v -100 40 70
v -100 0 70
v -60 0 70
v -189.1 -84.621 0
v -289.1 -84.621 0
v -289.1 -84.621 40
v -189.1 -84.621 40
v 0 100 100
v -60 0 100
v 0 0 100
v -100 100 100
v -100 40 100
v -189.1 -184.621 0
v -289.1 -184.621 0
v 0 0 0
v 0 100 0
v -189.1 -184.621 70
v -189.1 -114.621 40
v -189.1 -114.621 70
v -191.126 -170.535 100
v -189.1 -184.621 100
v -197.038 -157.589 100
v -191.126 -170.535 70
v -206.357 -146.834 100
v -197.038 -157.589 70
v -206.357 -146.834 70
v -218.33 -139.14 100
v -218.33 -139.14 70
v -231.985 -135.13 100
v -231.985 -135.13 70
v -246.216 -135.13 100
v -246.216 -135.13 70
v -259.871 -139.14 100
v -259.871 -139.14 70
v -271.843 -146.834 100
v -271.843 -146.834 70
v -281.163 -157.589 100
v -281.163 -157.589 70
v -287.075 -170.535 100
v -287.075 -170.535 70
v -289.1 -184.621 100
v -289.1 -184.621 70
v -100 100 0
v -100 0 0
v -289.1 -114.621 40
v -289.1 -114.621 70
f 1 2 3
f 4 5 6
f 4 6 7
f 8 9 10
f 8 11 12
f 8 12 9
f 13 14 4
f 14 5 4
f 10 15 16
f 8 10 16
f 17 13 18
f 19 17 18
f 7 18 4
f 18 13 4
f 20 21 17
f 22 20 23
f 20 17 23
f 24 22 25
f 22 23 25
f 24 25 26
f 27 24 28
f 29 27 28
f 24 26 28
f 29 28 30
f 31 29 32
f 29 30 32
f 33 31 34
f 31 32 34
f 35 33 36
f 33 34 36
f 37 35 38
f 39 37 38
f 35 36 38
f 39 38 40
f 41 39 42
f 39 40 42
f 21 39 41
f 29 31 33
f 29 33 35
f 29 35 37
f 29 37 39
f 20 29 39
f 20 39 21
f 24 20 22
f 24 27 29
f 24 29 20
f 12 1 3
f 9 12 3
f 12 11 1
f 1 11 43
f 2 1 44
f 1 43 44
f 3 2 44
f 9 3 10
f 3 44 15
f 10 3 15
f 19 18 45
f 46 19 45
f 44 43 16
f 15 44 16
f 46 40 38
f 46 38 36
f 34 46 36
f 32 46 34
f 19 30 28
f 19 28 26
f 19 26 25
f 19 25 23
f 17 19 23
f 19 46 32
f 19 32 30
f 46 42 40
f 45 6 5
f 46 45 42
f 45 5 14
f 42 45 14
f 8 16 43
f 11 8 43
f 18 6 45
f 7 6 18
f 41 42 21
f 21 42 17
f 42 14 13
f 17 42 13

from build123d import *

# Parameters (mm, degrees)
F1_DEPTH = 100
F2_DEPTH = 70
F3_W     = 100
F3_H     = 30
F4_DEPTH = 40
F5_DEPTH = 70
F6_DEPTH = 100


with BuildPart() as f1:
    # F0 (on Top) → F1 (new body)
    with BuildSketch(Plane.XY):
        Polygon((-60, 0), (0, 0), (0, 100), (-100, 100), (-100, 40), align=None)
    extrude(amount=F1_DEPTH)

    # F0 (on Top) → F2 (join)
    with BuildSketch(Plane.XY):
        Polygon((-100, 0), (-60, 0), (-100, 40), align=None)
        Polygon((-60, 0), (0, 0), (0, 100), (-100, 100), (-100, 40), align=None)
    extrude(amount=F2_DEPTH)


with BuildPart() as f4:
    # F3 (on Top) → F4 (new body)
    with BuildSketch(Plane.XY):
        with Locations((-239.100334983, -99.6214152873)):
            Rectangle(F3_W, F3_H)
    extrude(amount=F4_DEPTH)

    # F3 (on Top) → F5 (join)
    with BuildSketch(Plane.XY):
        with BuildLine():
            Line((-189.100334983, -184.6214152873), (-189.100334983, -114.6214152873))
            Line((-189.100334983, -114.6214152873), (-289.100334983, -114.6214152873))
            Line((-289.100334983, -114.6214152873), (-289.100334983, -184.6214152873))
            ThreePointArc((-289.100334983, -184.6214152873), (-239.100334983, -134.6214152873), (-189.100334983, -184.6214152873))
        make_face()
    extrude(amount=F5_DEPTH)

    # F3 (on Top) → F6 (join)
    with BuildSketch(Plane.XY):
        with BuildLine():
            Line((-289.100334983, -184.6214152873), (-189.100334983, -184.6214152873))
            ThreePointArc((-189.100334983, -184.6214152873), (-239.100334983, -134.6214152873), (-289.100334983, -184.6214152873))
        make_face()
    extrude(amount=F6_DEPTH)


solid = Compound([f1.part, f4.part])
